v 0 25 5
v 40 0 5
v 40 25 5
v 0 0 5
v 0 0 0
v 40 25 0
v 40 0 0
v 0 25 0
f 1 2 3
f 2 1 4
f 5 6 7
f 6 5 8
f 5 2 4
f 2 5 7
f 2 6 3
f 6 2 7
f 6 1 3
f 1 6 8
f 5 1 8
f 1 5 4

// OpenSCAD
// Missing vertical leg: only the horizontal base plate.
cube([40, 25, 5]);
